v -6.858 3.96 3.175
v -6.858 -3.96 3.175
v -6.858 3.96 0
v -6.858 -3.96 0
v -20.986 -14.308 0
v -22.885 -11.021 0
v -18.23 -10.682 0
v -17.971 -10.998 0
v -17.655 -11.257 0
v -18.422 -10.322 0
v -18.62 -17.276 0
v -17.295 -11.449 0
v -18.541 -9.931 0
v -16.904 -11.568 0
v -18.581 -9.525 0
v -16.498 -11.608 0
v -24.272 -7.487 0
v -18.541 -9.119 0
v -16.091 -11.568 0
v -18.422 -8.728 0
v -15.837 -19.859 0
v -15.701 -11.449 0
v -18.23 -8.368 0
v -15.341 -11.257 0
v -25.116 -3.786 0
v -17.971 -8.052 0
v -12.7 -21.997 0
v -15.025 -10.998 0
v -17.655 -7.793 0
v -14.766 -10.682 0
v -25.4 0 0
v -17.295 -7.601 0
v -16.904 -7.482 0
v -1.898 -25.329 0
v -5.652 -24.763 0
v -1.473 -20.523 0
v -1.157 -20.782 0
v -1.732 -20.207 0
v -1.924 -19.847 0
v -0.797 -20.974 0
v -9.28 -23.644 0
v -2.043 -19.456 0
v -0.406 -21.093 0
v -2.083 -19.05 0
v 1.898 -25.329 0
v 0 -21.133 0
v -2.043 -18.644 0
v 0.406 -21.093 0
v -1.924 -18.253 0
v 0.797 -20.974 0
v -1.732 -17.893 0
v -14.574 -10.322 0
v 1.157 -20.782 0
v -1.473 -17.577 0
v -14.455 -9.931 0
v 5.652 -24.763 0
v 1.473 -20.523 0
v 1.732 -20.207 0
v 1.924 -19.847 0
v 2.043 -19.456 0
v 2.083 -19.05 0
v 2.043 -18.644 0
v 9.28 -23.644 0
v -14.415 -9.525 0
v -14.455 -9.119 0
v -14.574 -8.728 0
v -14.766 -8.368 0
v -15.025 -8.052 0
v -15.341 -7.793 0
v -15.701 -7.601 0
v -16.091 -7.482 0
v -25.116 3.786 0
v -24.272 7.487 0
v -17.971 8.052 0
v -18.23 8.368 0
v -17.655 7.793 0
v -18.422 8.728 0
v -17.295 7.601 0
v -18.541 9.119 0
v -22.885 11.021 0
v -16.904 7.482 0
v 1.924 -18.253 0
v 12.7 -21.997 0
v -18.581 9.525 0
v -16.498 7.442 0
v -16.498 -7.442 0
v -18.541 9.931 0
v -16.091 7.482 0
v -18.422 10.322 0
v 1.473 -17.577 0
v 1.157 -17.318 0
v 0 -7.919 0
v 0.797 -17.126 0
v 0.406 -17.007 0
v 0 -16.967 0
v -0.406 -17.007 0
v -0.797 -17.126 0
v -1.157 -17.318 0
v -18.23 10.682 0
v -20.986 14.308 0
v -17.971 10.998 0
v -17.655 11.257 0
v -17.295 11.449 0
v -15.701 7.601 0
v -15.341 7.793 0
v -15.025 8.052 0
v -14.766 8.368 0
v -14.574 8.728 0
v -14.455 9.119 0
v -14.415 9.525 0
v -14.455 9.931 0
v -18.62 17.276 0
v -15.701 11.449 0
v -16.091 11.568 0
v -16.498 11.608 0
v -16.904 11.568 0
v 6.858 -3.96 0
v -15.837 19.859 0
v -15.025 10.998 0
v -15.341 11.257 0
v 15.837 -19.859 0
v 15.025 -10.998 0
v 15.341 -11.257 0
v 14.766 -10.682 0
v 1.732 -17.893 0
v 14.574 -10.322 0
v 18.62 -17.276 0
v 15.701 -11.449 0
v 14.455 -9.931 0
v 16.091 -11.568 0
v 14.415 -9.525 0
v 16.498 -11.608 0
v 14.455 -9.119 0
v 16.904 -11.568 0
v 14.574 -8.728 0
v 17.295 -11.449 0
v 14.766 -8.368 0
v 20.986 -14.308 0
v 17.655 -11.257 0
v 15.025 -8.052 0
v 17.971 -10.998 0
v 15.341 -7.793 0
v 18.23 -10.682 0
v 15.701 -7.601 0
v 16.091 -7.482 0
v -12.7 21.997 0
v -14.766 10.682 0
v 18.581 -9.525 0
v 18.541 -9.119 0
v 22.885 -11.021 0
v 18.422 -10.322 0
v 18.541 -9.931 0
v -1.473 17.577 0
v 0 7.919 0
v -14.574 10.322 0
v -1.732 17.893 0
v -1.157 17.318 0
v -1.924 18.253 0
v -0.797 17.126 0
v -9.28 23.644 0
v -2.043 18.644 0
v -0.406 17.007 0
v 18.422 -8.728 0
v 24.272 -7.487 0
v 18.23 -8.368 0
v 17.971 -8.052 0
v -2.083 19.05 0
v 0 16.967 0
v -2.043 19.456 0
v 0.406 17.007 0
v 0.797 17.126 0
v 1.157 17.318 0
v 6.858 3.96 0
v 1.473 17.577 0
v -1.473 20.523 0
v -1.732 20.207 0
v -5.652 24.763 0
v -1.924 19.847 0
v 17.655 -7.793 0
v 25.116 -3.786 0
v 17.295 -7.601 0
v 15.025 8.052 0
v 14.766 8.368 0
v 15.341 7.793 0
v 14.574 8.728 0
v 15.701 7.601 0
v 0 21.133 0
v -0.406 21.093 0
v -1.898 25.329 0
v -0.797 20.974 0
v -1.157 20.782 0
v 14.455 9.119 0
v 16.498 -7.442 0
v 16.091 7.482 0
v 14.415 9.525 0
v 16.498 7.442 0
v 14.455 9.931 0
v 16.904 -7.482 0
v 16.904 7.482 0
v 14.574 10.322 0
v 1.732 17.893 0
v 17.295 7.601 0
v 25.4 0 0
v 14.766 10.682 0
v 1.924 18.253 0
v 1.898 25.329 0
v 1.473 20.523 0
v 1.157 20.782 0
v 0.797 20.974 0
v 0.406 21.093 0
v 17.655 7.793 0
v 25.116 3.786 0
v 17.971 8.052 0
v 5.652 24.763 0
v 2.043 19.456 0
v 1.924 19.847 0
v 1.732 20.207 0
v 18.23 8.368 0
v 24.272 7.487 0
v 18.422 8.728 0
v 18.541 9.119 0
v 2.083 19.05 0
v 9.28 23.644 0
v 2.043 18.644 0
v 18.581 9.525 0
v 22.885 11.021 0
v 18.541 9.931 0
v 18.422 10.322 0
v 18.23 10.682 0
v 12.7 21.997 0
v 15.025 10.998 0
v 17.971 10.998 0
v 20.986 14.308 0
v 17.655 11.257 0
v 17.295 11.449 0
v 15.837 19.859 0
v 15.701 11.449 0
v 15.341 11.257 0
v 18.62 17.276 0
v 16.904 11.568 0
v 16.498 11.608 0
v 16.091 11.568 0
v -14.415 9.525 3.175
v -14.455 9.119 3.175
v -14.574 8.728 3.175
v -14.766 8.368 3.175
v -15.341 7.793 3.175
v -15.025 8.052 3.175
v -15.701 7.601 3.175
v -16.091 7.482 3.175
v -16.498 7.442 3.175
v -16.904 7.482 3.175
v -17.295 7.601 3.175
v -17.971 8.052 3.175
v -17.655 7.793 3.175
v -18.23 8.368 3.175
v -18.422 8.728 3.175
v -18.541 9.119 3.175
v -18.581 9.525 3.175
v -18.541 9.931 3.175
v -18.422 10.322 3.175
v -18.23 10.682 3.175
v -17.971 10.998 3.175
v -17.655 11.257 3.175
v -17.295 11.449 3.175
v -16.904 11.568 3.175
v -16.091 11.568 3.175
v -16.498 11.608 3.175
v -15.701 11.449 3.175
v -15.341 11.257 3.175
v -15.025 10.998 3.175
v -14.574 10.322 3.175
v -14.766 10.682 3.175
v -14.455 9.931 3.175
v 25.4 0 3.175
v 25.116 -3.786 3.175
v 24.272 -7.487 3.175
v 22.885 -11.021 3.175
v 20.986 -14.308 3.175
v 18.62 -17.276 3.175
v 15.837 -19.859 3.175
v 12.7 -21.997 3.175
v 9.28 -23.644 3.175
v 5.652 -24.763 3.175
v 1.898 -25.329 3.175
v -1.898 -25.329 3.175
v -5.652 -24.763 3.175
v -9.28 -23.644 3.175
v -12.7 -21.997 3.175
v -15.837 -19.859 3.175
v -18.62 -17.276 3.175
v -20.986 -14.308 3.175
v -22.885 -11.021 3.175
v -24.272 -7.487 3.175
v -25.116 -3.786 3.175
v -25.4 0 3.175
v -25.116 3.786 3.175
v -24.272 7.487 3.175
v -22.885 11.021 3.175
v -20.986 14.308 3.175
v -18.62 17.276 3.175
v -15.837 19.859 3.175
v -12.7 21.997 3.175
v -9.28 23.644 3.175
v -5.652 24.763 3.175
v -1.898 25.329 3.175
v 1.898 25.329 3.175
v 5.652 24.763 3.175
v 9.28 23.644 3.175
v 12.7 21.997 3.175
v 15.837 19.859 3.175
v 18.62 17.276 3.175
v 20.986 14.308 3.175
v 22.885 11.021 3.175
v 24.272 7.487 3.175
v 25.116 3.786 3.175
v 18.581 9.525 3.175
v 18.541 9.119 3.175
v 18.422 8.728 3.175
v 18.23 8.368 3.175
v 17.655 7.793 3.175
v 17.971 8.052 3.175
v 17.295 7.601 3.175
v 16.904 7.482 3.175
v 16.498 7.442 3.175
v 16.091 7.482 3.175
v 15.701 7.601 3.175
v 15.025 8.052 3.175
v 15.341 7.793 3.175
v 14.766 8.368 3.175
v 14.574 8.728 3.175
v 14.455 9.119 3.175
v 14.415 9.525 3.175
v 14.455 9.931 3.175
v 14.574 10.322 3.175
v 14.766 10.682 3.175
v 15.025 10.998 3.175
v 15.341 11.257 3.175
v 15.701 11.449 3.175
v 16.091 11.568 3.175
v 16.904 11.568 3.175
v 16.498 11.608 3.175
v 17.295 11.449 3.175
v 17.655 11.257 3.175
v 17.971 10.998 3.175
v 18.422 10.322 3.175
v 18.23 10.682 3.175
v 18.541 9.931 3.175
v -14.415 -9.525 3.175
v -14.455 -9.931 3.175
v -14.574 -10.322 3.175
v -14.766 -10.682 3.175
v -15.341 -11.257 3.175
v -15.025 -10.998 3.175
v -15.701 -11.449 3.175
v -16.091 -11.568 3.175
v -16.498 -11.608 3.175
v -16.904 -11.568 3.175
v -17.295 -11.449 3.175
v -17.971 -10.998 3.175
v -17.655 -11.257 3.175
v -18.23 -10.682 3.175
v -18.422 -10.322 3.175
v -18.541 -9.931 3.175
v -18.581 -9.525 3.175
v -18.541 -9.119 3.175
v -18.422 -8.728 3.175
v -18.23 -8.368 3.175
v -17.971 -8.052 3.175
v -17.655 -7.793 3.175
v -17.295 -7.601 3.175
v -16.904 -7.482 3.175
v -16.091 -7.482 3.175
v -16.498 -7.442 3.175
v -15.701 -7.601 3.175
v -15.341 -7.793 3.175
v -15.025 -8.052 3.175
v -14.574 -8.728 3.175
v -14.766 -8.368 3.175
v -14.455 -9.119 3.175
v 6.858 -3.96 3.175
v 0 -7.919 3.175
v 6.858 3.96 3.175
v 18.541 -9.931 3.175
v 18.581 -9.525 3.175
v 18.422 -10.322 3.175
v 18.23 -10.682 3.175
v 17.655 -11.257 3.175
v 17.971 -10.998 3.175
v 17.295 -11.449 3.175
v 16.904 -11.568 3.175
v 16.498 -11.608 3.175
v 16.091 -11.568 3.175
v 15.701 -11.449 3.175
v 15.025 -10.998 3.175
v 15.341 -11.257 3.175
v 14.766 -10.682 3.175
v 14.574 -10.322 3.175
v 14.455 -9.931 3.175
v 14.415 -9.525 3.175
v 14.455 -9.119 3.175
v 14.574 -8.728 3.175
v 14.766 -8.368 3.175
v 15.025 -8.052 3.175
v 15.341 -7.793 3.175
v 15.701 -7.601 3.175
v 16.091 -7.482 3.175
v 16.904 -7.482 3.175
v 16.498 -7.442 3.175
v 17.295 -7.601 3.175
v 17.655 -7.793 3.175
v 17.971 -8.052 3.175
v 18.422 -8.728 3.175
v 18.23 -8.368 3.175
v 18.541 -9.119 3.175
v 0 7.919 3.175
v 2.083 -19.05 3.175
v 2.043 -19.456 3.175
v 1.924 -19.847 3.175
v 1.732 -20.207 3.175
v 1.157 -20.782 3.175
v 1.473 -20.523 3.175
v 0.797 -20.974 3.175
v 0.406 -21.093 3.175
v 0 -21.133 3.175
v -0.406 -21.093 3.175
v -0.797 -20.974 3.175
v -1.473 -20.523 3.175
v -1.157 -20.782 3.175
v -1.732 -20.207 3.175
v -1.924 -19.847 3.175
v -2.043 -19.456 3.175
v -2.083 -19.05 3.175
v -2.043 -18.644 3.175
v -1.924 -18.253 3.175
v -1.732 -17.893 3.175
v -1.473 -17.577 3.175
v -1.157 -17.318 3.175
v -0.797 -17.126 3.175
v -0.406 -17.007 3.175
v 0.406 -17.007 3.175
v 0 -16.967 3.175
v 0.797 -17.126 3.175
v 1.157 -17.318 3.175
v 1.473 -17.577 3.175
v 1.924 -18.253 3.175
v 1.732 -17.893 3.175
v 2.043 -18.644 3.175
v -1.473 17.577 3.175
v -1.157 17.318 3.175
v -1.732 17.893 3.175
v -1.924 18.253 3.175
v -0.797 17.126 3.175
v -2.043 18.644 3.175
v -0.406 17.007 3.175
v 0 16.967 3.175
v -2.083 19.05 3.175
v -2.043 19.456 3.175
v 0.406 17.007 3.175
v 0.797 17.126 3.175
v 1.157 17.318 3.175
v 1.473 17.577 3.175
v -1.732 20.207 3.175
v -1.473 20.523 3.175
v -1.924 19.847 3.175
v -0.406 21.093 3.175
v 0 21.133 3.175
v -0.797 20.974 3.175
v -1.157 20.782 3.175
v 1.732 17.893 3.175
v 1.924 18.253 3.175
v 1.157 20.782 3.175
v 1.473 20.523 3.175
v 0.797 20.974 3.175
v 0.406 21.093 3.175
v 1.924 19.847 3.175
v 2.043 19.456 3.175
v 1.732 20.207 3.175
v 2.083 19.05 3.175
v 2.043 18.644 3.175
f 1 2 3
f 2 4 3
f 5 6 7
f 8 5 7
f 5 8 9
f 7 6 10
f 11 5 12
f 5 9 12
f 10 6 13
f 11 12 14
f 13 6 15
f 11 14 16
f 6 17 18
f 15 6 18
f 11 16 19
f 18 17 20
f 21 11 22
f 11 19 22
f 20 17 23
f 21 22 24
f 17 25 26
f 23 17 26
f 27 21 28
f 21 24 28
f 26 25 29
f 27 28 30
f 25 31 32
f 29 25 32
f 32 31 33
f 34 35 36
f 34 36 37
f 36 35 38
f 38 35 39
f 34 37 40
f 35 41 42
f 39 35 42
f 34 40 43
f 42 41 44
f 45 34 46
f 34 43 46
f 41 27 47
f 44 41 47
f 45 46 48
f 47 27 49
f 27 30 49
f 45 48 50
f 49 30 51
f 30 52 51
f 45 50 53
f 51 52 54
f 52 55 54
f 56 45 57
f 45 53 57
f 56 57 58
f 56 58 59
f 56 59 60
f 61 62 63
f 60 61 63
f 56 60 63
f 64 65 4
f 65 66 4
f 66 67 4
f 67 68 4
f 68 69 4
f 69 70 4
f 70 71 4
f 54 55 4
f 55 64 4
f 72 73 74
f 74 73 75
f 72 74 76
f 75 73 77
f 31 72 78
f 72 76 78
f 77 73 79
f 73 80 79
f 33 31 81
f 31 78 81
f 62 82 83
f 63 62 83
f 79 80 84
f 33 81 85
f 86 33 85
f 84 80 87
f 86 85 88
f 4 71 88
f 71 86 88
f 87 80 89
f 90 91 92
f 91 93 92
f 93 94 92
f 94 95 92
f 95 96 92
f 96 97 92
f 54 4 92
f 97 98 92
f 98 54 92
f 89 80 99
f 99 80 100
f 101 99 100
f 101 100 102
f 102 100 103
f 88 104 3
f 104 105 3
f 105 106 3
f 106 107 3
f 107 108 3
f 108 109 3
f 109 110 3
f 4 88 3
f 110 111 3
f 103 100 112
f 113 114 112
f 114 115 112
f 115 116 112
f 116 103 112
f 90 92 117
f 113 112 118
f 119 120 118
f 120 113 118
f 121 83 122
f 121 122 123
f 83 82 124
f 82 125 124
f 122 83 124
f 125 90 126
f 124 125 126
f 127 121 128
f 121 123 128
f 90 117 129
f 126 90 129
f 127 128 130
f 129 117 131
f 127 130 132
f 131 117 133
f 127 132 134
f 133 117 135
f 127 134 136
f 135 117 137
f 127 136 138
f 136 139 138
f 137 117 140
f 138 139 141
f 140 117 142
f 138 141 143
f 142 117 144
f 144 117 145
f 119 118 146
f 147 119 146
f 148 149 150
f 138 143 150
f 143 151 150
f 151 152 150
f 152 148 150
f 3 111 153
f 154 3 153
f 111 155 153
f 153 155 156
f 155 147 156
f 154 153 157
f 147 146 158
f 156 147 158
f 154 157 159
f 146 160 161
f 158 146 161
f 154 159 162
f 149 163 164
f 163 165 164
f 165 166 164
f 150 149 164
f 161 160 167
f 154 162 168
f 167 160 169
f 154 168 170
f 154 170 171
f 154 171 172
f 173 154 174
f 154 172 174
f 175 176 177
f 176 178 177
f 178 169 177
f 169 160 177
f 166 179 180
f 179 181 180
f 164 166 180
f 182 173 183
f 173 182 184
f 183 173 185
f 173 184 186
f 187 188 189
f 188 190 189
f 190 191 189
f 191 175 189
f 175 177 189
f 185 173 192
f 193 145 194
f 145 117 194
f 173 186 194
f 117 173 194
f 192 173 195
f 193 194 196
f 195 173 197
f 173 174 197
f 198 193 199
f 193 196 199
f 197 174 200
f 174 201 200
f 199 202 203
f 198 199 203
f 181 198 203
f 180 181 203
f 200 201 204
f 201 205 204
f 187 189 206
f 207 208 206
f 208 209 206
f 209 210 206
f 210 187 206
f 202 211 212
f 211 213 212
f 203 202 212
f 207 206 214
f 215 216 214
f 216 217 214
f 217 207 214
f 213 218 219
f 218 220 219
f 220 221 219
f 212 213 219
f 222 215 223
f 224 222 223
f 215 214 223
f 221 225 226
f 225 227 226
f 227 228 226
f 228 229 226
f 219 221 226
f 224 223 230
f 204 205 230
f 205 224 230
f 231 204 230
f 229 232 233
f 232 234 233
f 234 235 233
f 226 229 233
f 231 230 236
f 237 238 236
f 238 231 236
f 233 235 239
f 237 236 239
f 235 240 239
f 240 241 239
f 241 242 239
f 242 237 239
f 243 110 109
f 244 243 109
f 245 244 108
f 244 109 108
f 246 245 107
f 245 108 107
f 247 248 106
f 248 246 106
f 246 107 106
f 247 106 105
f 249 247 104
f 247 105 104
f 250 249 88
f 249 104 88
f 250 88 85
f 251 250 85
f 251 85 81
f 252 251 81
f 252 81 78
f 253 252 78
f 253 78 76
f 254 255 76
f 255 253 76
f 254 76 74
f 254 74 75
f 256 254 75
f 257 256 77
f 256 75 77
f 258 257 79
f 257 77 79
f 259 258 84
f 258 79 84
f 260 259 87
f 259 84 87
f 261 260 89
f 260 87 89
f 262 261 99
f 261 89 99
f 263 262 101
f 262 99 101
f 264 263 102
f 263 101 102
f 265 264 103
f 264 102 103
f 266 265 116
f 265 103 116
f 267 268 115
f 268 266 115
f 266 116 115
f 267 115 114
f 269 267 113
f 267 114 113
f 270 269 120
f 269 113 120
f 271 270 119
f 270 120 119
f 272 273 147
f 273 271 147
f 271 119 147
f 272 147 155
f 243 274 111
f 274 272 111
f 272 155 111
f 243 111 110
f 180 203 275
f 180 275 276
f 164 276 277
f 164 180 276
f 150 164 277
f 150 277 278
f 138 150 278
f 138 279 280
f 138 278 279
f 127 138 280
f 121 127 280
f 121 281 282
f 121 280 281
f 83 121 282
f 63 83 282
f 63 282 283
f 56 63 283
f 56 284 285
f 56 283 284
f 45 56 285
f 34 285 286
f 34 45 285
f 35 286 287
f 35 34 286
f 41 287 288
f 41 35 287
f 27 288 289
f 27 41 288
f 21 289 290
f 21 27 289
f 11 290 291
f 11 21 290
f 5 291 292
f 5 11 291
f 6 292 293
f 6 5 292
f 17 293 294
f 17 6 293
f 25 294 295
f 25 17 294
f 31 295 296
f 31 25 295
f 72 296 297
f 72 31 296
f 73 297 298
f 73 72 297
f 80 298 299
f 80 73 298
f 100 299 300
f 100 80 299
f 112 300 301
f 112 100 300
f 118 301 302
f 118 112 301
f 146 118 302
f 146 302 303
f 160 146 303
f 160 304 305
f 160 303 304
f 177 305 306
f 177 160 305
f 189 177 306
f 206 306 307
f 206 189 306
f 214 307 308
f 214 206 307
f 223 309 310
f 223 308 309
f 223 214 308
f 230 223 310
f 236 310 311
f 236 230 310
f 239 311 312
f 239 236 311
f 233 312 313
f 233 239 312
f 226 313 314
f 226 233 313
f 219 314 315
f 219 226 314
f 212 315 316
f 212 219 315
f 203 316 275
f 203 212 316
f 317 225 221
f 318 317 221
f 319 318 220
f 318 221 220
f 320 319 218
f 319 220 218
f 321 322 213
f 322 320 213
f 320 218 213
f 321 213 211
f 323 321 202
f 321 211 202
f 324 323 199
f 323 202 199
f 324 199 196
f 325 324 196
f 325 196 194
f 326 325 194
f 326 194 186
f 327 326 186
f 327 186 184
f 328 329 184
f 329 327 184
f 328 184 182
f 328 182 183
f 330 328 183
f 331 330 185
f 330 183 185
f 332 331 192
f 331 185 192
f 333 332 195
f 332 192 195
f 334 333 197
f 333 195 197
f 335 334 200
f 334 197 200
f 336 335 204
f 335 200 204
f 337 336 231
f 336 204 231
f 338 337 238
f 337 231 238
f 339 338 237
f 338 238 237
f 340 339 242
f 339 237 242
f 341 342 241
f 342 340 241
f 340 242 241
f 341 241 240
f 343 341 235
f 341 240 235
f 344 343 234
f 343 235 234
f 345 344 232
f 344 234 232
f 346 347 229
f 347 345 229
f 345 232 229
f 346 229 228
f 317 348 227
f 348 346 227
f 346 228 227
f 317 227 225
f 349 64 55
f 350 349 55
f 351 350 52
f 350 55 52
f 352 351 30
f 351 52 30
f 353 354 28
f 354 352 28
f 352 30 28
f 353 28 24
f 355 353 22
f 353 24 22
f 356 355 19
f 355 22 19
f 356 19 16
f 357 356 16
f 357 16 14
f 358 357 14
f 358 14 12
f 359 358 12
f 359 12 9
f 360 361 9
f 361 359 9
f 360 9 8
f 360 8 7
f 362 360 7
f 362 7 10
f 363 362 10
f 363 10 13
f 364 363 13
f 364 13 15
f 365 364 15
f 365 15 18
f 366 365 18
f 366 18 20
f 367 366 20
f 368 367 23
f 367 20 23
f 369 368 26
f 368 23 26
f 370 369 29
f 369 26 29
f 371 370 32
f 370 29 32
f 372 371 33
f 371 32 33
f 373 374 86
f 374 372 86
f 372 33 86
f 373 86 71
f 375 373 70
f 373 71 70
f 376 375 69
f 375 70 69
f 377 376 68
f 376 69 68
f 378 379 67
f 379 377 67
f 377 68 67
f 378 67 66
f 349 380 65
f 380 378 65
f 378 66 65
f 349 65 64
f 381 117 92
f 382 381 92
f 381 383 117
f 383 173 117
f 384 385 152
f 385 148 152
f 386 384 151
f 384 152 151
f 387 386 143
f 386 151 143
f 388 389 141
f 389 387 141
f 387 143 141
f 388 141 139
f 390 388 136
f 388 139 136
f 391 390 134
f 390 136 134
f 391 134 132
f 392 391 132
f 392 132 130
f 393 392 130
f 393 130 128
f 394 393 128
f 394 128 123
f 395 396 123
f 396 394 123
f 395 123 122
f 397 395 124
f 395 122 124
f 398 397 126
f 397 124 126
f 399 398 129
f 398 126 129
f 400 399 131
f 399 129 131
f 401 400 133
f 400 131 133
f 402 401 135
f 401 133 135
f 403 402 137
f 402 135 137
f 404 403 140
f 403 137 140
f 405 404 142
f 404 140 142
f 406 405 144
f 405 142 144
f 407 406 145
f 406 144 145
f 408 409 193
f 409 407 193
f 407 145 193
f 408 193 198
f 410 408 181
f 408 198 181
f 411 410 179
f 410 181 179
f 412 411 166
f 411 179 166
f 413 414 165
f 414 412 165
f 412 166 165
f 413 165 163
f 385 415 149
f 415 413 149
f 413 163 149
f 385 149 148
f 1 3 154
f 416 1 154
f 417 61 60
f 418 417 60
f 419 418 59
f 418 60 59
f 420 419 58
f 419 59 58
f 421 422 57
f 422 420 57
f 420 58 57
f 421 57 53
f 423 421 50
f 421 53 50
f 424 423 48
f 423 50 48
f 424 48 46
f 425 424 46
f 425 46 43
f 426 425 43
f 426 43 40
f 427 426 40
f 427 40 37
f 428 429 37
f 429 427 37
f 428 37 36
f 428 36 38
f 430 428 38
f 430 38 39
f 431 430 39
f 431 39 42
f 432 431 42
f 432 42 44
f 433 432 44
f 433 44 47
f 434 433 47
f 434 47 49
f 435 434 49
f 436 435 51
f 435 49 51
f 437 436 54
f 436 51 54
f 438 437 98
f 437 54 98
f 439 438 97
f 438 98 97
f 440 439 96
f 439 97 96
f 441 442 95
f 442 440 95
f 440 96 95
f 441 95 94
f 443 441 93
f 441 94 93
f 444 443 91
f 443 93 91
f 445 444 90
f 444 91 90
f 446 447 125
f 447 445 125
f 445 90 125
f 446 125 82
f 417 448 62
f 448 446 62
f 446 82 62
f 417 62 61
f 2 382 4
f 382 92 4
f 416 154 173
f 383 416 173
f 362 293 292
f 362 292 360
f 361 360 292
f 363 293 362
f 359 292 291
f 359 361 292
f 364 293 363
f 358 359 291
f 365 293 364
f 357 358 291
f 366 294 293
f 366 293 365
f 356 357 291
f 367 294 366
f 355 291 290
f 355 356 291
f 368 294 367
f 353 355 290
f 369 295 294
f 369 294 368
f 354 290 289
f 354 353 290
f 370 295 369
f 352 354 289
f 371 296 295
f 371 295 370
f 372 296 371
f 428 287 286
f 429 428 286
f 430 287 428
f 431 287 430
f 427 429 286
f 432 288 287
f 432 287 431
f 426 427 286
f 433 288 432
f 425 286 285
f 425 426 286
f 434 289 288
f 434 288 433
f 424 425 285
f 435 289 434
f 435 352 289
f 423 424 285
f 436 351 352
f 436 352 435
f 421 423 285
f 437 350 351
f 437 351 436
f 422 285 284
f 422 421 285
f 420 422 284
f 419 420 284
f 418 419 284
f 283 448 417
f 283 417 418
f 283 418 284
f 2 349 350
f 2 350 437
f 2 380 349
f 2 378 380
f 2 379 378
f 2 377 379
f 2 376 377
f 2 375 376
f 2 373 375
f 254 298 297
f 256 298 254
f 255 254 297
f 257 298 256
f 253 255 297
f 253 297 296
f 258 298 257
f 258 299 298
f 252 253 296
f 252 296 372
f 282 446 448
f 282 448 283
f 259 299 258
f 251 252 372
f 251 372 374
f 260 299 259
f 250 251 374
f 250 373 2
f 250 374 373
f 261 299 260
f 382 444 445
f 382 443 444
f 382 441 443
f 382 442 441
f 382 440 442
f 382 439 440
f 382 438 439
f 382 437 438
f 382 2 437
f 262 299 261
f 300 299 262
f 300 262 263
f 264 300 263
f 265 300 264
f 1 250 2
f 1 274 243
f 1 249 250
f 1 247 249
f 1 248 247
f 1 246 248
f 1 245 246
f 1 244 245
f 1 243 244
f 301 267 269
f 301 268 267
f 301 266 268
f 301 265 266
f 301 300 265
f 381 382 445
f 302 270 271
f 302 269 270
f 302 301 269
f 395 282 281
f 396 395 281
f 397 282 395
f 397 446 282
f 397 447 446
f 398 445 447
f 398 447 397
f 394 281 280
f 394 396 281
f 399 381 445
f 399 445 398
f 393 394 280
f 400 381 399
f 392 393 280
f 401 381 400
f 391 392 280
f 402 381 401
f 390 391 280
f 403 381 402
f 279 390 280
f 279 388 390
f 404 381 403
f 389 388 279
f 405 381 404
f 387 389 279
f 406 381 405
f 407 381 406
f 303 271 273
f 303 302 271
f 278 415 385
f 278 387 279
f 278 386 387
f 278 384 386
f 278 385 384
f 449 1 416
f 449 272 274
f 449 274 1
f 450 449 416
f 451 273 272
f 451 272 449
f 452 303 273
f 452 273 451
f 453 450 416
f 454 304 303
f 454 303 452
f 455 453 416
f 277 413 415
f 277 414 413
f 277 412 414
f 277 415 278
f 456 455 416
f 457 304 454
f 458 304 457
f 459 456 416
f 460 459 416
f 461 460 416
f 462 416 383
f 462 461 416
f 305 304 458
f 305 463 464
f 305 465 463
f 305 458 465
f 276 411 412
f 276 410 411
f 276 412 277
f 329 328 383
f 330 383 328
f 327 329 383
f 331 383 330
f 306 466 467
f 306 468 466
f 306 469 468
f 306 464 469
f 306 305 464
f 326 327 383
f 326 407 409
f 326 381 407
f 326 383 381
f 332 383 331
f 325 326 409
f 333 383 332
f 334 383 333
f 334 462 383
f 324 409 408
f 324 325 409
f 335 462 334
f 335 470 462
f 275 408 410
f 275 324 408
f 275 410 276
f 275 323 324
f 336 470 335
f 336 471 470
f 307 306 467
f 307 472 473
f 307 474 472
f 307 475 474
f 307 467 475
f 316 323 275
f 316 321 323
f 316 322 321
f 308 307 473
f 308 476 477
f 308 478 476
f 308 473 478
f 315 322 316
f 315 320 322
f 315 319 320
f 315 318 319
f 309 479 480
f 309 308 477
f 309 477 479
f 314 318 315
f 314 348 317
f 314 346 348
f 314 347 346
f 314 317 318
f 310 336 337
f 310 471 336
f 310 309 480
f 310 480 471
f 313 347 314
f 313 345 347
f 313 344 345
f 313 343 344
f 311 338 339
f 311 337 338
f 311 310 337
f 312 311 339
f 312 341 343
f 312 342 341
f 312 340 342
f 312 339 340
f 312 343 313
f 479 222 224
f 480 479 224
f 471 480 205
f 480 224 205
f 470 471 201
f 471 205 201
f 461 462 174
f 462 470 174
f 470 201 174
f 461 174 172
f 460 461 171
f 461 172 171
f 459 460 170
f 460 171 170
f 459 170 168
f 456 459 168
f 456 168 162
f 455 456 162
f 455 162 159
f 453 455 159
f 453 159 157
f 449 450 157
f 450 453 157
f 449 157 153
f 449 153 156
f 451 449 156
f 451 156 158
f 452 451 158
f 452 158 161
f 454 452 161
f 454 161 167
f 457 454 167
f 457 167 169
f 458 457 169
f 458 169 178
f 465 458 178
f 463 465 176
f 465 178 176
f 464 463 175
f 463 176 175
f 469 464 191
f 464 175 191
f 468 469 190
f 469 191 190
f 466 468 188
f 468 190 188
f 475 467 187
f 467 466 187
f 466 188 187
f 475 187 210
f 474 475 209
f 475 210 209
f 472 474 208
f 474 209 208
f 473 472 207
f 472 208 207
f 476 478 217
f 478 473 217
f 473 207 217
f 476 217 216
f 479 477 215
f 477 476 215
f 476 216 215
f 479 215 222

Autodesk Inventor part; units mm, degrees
ref_plane "YZ Plane" through (0, 0, 0) normal (1, 0, 0) x (0, 1, 0)
ref_plane "XZ Plane" through (0, 0, 0) normal (0, 1, 0) x (-1, 0, 0)
ref_plane "XY Plane" through (0, 0, 0) normal (0, 0, 1) x (1, 0, 0)
sketch "Sketch1" plane through (0, 0, 0) normal (0, 0, 1) x (1, 0, 0)
  circle A0 centre (0, 0) radius 25.4
  circle A1 centre (0, 19.05) radius 2.0828
  line L0 (0, 0) -> (0, 19.05) construction
  circle A2 centre (-16.4978, 9.525) radius 2.0828
  circle A3 centre (-16.4978, -9.525) radius 2.0828
  circle A4 centre (0, -19.05) radius 2.0828
  circle A5 centre (16.4978, -9.525) radius 2.0828
  circle A6 centre (16.4978, 9.525) radius 2.0828
  line L1 (6.858, -3.9595) -> (0, -7.9189)
  line L2 (0, -7.9189) -> (-6.858, -3.9595)
  line L3 (-6.858, -3.9595) -> (-6.858, 3.9595)
  line L4 (-6.858, 3.9595) -> (0, 7.9189)
  line L5 (0, 7.9189) -> (6.858, 3.9595)
  line L6 (6.858, 3.9595) -> (6.858, -3.9595)
  dimension "d0" = 50.8
  dimension "d2" = 4.1656
  dimension "d3" = 19.05
  dimension "d6" = 360
  dimension "d10" = 13.716
extrude "Extrusion1" add sketch "Sketch1" along normal blind 3.175
properties part number "Hex Shaft Connector (Lexan)" material "Aluminum 6061"
